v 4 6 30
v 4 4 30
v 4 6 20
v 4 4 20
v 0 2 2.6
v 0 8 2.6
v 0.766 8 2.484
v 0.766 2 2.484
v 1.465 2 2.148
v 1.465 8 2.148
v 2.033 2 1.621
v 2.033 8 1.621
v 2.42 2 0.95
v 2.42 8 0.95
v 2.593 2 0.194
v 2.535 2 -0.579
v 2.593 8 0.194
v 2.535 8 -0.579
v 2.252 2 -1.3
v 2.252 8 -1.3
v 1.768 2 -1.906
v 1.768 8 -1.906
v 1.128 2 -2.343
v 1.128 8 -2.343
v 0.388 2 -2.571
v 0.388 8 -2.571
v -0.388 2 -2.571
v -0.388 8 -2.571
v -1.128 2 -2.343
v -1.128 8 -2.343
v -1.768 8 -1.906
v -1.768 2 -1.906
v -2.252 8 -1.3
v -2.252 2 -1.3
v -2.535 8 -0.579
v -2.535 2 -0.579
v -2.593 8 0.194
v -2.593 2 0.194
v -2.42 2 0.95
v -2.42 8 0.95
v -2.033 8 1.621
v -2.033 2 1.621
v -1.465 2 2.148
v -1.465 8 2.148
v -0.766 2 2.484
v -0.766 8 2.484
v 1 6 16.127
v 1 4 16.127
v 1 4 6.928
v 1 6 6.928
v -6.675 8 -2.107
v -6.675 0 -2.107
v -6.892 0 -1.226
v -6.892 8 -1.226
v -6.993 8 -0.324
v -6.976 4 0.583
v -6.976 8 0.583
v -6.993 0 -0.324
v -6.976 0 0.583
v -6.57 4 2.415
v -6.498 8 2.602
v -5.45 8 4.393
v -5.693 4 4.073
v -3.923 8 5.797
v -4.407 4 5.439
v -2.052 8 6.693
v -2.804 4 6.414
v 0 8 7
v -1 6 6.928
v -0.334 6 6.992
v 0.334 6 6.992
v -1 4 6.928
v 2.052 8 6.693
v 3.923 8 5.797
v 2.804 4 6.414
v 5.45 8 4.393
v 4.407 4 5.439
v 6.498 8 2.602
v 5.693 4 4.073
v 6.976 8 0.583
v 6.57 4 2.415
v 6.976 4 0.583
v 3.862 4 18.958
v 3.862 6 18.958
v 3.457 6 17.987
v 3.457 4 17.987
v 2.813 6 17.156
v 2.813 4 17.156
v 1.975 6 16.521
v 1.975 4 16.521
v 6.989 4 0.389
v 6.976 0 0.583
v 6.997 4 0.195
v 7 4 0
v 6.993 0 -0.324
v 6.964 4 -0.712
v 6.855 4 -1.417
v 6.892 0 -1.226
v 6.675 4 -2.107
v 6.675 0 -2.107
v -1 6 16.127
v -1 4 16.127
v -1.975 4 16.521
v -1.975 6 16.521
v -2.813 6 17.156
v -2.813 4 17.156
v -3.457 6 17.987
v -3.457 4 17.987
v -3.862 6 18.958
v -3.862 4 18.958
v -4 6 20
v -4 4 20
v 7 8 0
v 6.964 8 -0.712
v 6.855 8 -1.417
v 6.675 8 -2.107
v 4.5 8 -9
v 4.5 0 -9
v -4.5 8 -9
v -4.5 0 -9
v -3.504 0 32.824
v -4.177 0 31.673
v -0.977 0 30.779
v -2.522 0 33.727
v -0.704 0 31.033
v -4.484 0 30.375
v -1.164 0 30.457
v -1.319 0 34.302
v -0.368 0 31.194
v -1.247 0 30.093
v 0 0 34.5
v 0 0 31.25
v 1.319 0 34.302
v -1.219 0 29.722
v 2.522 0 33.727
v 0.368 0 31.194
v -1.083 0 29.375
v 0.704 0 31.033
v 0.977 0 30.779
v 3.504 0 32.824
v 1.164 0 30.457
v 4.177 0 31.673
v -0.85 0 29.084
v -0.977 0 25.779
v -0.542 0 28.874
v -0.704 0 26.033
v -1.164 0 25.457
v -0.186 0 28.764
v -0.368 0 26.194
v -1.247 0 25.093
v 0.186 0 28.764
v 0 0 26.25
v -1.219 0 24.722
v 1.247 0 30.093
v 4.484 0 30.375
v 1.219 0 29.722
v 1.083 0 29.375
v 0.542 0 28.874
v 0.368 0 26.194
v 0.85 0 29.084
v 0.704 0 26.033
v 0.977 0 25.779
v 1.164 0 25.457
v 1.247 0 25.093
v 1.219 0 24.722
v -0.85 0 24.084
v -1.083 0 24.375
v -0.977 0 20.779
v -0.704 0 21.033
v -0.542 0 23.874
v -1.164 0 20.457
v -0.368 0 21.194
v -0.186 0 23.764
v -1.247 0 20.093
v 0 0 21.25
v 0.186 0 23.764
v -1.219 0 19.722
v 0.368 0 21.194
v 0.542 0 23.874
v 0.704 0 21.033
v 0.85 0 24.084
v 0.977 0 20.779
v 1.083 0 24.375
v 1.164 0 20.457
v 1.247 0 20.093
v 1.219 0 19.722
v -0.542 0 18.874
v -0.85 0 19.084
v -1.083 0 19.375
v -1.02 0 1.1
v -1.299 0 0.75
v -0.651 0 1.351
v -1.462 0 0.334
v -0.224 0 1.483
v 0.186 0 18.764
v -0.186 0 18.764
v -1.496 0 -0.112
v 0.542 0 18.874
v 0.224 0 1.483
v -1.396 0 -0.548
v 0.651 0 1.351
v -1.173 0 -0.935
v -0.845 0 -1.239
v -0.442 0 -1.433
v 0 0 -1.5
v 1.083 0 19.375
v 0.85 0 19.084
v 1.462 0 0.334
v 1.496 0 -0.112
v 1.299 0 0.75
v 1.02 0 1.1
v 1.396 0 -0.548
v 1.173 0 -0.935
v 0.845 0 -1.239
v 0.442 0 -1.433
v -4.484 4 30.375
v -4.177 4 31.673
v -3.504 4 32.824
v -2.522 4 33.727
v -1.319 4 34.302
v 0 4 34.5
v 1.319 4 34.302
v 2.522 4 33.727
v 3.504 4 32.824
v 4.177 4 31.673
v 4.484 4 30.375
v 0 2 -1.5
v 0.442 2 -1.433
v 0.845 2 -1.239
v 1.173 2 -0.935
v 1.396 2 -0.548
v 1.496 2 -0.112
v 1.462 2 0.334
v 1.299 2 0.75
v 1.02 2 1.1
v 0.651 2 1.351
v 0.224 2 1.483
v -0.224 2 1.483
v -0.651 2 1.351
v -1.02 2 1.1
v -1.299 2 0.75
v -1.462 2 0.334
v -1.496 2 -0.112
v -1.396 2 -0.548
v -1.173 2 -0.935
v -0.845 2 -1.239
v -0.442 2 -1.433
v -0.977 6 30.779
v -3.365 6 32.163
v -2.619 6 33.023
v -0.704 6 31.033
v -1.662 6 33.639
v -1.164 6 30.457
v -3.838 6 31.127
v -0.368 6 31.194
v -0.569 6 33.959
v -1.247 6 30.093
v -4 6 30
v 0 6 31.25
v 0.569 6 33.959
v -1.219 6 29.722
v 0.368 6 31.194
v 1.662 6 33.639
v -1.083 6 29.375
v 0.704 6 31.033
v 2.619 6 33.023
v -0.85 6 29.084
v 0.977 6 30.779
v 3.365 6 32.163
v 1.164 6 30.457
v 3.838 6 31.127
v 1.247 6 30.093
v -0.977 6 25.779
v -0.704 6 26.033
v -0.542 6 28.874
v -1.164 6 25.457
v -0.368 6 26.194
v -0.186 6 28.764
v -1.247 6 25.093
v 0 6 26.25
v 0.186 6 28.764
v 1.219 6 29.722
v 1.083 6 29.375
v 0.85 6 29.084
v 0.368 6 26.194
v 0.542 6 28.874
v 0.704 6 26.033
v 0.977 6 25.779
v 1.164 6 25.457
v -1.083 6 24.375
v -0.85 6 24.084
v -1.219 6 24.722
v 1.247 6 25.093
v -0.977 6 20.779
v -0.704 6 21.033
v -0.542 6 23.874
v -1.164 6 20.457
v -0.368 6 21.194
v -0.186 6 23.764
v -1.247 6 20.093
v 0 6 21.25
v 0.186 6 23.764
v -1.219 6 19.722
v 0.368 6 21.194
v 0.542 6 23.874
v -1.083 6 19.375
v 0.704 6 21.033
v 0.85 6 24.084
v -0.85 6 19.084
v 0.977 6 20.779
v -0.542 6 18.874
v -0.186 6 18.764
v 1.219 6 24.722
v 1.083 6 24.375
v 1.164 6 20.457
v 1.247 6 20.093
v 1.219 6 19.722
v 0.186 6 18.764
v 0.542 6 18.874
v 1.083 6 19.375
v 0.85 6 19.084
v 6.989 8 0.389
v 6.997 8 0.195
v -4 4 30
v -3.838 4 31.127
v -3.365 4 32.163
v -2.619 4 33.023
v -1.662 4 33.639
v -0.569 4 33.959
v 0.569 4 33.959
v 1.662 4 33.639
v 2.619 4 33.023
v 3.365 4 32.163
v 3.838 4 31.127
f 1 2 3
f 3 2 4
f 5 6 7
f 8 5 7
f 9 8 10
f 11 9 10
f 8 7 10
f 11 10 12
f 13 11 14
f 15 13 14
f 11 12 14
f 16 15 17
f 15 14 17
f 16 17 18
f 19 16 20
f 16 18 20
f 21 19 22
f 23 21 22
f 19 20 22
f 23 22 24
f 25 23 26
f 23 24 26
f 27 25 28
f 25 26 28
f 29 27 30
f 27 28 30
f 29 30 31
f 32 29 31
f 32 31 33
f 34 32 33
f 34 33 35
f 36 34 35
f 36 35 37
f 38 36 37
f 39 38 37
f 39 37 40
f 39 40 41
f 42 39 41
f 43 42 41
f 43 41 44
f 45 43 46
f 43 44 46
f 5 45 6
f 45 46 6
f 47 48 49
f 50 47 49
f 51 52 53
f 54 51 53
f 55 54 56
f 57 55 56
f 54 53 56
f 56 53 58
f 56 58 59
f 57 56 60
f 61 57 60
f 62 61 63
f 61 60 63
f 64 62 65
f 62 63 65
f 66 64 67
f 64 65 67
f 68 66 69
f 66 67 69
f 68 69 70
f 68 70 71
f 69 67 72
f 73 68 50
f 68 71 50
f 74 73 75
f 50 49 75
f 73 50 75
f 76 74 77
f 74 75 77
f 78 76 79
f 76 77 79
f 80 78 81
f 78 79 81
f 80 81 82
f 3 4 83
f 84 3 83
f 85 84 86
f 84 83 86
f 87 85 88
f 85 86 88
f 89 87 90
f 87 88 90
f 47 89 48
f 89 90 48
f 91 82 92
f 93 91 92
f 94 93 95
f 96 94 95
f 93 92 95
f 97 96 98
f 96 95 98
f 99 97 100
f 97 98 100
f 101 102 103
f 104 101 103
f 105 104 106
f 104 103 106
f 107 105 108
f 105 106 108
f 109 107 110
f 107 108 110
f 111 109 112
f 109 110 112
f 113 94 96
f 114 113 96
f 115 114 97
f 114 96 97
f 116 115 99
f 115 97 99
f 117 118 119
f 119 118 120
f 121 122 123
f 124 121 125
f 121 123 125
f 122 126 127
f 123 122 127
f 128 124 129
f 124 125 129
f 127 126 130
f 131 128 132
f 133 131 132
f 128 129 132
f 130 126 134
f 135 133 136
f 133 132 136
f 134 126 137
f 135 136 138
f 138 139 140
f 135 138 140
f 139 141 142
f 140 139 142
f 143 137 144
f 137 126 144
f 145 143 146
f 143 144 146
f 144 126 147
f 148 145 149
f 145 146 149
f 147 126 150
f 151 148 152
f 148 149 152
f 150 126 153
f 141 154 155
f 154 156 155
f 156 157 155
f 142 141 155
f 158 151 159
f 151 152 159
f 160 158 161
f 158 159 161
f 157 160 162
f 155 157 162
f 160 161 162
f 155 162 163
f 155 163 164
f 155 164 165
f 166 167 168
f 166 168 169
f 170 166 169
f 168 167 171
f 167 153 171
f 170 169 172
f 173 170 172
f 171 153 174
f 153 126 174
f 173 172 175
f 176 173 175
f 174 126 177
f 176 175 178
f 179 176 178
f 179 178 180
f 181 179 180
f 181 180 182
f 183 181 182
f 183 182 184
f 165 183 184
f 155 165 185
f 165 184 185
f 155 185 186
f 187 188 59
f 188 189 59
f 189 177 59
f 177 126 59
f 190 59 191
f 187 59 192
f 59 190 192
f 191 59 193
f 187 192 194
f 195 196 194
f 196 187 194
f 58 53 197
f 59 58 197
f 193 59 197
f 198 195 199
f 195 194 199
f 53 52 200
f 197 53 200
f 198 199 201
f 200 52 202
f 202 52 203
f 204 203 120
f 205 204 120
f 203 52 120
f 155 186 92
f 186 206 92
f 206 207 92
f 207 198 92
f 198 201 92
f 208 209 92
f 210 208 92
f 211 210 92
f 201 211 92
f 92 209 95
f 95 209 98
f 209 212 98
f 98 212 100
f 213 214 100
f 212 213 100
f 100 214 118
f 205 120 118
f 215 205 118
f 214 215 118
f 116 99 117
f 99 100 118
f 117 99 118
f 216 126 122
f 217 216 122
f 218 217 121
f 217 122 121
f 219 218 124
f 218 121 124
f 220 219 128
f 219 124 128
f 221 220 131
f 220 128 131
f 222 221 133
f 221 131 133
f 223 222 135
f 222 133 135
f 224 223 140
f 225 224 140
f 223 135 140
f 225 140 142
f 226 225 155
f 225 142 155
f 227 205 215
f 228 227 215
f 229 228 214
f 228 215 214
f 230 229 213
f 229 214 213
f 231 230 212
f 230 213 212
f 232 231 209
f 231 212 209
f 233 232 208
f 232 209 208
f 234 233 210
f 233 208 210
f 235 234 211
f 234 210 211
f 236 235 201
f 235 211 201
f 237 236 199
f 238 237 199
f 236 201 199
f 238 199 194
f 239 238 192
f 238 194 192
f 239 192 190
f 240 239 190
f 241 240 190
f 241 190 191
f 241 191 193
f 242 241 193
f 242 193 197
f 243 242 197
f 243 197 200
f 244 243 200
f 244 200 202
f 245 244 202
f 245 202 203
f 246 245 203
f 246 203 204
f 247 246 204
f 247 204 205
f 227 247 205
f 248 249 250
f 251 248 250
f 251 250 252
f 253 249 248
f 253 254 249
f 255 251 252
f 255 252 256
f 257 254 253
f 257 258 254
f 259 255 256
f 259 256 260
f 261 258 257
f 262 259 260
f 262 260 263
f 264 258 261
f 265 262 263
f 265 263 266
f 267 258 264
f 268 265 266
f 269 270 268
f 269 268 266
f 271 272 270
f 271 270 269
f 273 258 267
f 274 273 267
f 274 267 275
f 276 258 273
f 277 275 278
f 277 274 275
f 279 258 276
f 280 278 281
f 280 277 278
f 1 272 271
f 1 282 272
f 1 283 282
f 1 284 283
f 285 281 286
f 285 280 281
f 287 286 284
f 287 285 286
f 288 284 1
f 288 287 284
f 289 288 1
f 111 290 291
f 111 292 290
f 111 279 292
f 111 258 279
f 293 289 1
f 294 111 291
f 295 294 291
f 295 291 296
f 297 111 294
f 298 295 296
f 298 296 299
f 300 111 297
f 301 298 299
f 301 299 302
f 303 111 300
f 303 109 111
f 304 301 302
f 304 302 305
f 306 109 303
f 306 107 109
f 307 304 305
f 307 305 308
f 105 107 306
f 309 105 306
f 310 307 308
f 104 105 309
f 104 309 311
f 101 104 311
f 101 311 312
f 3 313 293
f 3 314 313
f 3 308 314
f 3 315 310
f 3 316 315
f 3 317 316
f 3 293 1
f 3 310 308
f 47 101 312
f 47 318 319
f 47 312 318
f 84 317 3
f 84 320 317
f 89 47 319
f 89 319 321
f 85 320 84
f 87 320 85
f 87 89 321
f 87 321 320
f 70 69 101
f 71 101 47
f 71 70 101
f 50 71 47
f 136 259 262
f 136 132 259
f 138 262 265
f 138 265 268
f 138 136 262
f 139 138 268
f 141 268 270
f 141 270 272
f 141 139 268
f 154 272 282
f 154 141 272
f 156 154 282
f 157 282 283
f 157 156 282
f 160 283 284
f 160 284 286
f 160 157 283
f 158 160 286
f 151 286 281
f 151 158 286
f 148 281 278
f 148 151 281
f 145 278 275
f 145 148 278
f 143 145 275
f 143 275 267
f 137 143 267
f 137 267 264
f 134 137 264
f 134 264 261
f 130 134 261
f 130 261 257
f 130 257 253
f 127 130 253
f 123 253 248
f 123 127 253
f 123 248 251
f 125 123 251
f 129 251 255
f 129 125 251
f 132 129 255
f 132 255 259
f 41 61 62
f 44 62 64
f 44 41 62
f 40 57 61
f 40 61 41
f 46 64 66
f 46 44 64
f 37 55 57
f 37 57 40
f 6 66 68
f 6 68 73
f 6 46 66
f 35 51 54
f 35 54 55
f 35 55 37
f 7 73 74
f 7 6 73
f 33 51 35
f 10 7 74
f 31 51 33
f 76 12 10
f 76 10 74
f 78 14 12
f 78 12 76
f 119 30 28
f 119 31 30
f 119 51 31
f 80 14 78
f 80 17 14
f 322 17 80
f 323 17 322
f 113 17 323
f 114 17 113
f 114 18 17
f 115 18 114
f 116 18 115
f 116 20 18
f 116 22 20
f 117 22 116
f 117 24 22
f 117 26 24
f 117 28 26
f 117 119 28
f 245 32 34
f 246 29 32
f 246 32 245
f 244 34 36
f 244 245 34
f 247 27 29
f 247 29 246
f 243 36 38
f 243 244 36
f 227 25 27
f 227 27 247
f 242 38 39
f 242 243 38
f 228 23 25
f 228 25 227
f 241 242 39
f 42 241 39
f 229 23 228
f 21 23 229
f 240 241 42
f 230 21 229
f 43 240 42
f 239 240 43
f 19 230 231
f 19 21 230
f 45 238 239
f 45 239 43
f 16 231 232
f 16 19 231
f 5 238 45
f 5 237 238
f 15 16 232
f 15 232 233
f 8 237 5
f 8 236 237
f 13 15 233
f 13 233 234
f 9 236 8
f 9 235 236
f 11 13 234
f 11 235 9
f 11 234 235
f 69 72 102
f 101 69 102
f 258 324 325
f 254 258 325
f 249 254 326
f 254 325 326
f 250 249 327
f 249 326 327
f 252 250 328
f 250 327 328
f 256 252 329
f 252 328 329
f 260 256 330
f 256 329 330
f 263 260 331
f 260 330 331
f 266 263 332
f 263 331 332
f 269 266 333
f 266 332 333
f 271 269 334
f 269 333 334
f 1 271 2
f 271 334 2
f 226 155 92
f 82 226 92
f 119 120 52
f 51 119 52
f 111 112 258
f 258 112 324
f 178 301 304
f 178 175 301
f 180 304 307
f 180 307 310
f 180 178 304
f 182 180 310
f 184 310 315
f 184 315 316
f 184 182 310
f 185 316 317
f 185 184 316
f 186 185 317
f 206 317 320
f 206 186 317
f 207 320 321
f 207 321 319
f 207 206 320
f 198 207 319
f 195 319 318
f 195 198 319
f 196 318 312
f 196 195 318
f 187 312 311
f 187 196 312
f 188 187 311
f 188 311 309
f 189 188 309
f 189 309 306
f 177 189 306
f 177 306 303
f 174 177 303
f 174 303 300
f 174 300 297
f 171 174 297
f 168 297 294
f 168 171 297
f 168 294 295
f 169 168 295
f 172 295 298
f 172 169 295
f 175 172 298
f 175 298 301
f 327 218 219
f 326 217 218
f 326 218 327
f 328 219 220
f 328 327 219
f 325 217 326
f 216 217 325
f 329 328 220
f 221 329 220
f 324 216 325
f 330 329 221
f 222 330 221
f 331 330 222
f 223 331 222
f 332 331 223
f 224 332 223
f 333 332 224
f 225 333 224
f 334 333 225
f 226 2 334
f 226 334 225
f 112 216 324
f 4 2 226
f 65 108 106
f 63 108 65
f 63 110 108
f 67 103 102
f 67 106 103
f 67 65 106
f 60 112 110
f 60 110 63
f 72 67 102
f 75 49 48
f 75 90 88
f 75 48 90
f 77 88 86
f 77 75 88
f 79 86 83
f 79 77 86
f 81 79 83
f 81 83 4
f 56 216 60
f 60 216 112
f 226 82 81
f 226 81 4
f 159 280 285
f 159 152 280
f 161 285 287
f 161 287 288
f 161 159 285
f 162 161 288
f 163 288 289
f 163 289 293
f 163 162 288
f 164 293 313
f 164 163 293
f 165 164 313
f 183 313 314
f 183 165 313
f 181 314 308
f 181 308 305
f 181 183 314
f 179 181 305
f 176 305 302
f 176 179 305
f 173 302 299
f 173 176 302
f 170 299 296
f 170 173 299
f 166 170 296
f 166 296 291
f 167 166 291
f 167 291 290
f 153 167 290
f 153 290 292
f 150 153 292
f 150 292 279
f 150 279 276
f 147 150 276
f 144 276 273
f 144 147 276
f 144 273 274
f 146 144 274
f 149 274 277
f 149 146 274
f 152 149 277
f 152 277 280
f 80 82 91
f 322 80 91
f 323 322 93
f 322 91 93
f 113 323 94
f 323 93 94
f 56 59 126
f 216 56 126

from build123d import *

# Parameters (mm, degrees)
SKETCH_1_R          = 1.25
EXTRUDE_1_DEPTH     = 4
EXTRUDE_2_DEPTH     = 4
SKETCH_3_R          = 1.25
EXTRUDE_3_DEPTH     = 2
SKETCH_4_R          = 2.6
CUT_EXTRUDE_1_DEPTH = 6
SKETCH_5_R          = 1.5
CUT_EXTRUDE_2_DEPTH = 37.100554012


with BuildPart() as part:
    # 草图1 → 凸台-拉伸1 (new body)
    with BuildSketch(Plane(origin=(0, 0, 0), x_dir=(1, 0, 0), z_dir=(0, 1, 0))):
        with BuildLine():
            Line((4.5, 9), (-4.5, 9))
            Line((-4.5, 9), (-6.675458936, 2.106714976))
            ThreePointArc((-6.675458936, 2.106714976), (-6.956816665, 0.776338774), (-6.9756521, -0.583333333))
            Line((-6.9756521, -0.583333333), (-4.484347779, -30.375))
            ThreePointArc((-4.484347779, -30.375), (0, -34.5), (4.484347779, -30.375))
            Line((4.484347779, -30.375), (6.9756521, -0.583333333))
            ThreePointArc((6.9756521, -0.583333333), (6.956816665, 0.776338774), (6.675458936, 2.106714976))
            Line((6.675458936, 2.106714976), (4.5, 9))
        make_face()
        with Locations(Location((0, -25, 0), (0, 0, 270))):
            Circle(SKETCH_1_R, mode=Mode.SUBTRACT)
        with Locations(Location((0, -20, 0), (0, 0, 270))):
            Circle(SKETCH_1_R, mode=Mode.SUBTRACT)
        with Locations(Location((0, -30, 0), (0, 0, 270))):
            Circle(SKETCH_1_R, mode=Mode.SUBTRACT)
    extrude(amount=EXTRUDE_1_DEPTH)

    # 草图2 → 凸台-拉伸2 (add)
    with BuildSketch(Plane(origin=(0, 4, 0), x_dir=(1, 0, 0), z_dir=(0, 1, 0))):
        with BuildLine():
            ThreePointArc((-6.675458936, 2.106714976), (-6.956816665, 0.776338774), (-6.9756521, -0.583333333))
            ThreePointArc((-6.9756521, -0.583333333), (0, -7), (6.9756521, -0.583333333))
            ThreePointArc((6.9756521, -0.583333333), (6.993910376, -0.291920622), (7, 0))
            ThreePointArc((7, 0), (6.918388994, 1.06578315), (6.675458936, 2.106714976))
            ThreePointArc((6.675458936, 2.106714976), (0, 7), (-6.675458936, 2.106714976))
        make_face()
        with BuildLine():
            Line((-4.5, 9), (-6.675458936, 2.106714976))
            ThreePointArc((-6.675458936, 2.106714976), (0, 7), (6.675458936, 2.106714976))
            Line((6.675458936, 2.106714976), (4.5, 9))
            Line((4.5, 9), (-4.5, 9))
        make_face()
    extrude(amount=EXTRUDE_2_DEPTH)

    # 草图3 → 凸台-拉伸3 (add)
    # profile 1 of 3: a face of its own
    with BuildSketch(Plane(origin=(0, 4, 0), x_dir=(1, 0, 0), z_dir=(0, 1, 0))):
        with BuildLine():
            Line((1, -16.980196905), (-1, -16.980196905))
            Line((-1, -16.980196905), (-1, -16.127016654))
            ThreePointArc((-1, -16.127016654), (-3.16227766, -17.550510257), (-4, -20))
            Line((-4, -20), (-4, -30))
            ThreePointArc((-4, -30), (0, -34), (4, -30))
            Line((4, -30), (4, -20))
            ThreePointArc((4, -20), (3.16227766, -17.550510257), (1, -16.127016654))
            Line((1, -16.127016654), (1, -16.980196905))
        make_face()
        with Locations(Location((0, -30, 0), (0, 0, 270))):
            Circle(SKETCH_3_R, mode=Mode.SUBTRACT)
        with Locations(Location((0, -25, 0), (0, 0, 270))):
            Circle(SKETCH_3_R, mode=Mode.SUBTRACT)
        with Locations(Location((0, -20, 0), (0, 0, 270))):
            Circle(SKETCH_3_R, mode=Mode.SUBTRACT)
    # profile 2 of 3: a face of its own
    with BuildSketch(Plane(origin=(0, 4, 0), x_dir=(1, 0, 0), z_dir=(0, 1, 0))):
        with BuildLine():
            Line((-1, -16.127016654), (-1, -16.980196905))
            Line((-1, -16.980196905), (1, -16.980196905))
            Line((1, -16.980196905), (1, -16.127016654))
            ThreePointArc((1, -16.127016654), (0, -16), (-1, -16.127016654))
        make_face()
    # profile 3 of 3: a face of its own
    with BuildSketch(Plane(origin=(0, 4, 0), x_dir=(1, 0, 0), z_dir=(0, 1, 0))):
        with BuildLine():
            Line((-1, -6.92820323), (-1, -16.127016654))
            ThreePointArc((-1, -16.127016654), (0, -16), (1, -16.127016654))
            Line((1, -16.127016654), (1, -6.92820323))
            ThreePointArc((1, -6.92820323), (0, -7), (-1, -6.92820323))
        make_face()
    extrude(amount=EXTRUDE_3_DEPTH)

    # 草图4 → 切除-拉伸1 (cut)
    with BuildSketch(Plane(origin=(0, 8, 0), x_dir=(1, 0, 0), z_dir=(0, 1, 0))):
        with Locations(Location((0, 0, 0), (0, 0, 270))):
            Circle(SKETCH_4_R)
    extrude(amount=-CUT_EXTRUDE_1_DEPTH, mode=Mode.SUBTRACT)

    # 草图5 → 切除-拉伸2 (cut, through all)
    with BuildSketch(Plane.XZ):
        with Locations(Location((0, 0, 0), (0, 0, 270))):
            Circle(SKETCH_5_R)
    extrude(amount=-CUT_EXTRUDE_2_DEPTH, mode=Mode.SUBTRACT)


solid = part.part
